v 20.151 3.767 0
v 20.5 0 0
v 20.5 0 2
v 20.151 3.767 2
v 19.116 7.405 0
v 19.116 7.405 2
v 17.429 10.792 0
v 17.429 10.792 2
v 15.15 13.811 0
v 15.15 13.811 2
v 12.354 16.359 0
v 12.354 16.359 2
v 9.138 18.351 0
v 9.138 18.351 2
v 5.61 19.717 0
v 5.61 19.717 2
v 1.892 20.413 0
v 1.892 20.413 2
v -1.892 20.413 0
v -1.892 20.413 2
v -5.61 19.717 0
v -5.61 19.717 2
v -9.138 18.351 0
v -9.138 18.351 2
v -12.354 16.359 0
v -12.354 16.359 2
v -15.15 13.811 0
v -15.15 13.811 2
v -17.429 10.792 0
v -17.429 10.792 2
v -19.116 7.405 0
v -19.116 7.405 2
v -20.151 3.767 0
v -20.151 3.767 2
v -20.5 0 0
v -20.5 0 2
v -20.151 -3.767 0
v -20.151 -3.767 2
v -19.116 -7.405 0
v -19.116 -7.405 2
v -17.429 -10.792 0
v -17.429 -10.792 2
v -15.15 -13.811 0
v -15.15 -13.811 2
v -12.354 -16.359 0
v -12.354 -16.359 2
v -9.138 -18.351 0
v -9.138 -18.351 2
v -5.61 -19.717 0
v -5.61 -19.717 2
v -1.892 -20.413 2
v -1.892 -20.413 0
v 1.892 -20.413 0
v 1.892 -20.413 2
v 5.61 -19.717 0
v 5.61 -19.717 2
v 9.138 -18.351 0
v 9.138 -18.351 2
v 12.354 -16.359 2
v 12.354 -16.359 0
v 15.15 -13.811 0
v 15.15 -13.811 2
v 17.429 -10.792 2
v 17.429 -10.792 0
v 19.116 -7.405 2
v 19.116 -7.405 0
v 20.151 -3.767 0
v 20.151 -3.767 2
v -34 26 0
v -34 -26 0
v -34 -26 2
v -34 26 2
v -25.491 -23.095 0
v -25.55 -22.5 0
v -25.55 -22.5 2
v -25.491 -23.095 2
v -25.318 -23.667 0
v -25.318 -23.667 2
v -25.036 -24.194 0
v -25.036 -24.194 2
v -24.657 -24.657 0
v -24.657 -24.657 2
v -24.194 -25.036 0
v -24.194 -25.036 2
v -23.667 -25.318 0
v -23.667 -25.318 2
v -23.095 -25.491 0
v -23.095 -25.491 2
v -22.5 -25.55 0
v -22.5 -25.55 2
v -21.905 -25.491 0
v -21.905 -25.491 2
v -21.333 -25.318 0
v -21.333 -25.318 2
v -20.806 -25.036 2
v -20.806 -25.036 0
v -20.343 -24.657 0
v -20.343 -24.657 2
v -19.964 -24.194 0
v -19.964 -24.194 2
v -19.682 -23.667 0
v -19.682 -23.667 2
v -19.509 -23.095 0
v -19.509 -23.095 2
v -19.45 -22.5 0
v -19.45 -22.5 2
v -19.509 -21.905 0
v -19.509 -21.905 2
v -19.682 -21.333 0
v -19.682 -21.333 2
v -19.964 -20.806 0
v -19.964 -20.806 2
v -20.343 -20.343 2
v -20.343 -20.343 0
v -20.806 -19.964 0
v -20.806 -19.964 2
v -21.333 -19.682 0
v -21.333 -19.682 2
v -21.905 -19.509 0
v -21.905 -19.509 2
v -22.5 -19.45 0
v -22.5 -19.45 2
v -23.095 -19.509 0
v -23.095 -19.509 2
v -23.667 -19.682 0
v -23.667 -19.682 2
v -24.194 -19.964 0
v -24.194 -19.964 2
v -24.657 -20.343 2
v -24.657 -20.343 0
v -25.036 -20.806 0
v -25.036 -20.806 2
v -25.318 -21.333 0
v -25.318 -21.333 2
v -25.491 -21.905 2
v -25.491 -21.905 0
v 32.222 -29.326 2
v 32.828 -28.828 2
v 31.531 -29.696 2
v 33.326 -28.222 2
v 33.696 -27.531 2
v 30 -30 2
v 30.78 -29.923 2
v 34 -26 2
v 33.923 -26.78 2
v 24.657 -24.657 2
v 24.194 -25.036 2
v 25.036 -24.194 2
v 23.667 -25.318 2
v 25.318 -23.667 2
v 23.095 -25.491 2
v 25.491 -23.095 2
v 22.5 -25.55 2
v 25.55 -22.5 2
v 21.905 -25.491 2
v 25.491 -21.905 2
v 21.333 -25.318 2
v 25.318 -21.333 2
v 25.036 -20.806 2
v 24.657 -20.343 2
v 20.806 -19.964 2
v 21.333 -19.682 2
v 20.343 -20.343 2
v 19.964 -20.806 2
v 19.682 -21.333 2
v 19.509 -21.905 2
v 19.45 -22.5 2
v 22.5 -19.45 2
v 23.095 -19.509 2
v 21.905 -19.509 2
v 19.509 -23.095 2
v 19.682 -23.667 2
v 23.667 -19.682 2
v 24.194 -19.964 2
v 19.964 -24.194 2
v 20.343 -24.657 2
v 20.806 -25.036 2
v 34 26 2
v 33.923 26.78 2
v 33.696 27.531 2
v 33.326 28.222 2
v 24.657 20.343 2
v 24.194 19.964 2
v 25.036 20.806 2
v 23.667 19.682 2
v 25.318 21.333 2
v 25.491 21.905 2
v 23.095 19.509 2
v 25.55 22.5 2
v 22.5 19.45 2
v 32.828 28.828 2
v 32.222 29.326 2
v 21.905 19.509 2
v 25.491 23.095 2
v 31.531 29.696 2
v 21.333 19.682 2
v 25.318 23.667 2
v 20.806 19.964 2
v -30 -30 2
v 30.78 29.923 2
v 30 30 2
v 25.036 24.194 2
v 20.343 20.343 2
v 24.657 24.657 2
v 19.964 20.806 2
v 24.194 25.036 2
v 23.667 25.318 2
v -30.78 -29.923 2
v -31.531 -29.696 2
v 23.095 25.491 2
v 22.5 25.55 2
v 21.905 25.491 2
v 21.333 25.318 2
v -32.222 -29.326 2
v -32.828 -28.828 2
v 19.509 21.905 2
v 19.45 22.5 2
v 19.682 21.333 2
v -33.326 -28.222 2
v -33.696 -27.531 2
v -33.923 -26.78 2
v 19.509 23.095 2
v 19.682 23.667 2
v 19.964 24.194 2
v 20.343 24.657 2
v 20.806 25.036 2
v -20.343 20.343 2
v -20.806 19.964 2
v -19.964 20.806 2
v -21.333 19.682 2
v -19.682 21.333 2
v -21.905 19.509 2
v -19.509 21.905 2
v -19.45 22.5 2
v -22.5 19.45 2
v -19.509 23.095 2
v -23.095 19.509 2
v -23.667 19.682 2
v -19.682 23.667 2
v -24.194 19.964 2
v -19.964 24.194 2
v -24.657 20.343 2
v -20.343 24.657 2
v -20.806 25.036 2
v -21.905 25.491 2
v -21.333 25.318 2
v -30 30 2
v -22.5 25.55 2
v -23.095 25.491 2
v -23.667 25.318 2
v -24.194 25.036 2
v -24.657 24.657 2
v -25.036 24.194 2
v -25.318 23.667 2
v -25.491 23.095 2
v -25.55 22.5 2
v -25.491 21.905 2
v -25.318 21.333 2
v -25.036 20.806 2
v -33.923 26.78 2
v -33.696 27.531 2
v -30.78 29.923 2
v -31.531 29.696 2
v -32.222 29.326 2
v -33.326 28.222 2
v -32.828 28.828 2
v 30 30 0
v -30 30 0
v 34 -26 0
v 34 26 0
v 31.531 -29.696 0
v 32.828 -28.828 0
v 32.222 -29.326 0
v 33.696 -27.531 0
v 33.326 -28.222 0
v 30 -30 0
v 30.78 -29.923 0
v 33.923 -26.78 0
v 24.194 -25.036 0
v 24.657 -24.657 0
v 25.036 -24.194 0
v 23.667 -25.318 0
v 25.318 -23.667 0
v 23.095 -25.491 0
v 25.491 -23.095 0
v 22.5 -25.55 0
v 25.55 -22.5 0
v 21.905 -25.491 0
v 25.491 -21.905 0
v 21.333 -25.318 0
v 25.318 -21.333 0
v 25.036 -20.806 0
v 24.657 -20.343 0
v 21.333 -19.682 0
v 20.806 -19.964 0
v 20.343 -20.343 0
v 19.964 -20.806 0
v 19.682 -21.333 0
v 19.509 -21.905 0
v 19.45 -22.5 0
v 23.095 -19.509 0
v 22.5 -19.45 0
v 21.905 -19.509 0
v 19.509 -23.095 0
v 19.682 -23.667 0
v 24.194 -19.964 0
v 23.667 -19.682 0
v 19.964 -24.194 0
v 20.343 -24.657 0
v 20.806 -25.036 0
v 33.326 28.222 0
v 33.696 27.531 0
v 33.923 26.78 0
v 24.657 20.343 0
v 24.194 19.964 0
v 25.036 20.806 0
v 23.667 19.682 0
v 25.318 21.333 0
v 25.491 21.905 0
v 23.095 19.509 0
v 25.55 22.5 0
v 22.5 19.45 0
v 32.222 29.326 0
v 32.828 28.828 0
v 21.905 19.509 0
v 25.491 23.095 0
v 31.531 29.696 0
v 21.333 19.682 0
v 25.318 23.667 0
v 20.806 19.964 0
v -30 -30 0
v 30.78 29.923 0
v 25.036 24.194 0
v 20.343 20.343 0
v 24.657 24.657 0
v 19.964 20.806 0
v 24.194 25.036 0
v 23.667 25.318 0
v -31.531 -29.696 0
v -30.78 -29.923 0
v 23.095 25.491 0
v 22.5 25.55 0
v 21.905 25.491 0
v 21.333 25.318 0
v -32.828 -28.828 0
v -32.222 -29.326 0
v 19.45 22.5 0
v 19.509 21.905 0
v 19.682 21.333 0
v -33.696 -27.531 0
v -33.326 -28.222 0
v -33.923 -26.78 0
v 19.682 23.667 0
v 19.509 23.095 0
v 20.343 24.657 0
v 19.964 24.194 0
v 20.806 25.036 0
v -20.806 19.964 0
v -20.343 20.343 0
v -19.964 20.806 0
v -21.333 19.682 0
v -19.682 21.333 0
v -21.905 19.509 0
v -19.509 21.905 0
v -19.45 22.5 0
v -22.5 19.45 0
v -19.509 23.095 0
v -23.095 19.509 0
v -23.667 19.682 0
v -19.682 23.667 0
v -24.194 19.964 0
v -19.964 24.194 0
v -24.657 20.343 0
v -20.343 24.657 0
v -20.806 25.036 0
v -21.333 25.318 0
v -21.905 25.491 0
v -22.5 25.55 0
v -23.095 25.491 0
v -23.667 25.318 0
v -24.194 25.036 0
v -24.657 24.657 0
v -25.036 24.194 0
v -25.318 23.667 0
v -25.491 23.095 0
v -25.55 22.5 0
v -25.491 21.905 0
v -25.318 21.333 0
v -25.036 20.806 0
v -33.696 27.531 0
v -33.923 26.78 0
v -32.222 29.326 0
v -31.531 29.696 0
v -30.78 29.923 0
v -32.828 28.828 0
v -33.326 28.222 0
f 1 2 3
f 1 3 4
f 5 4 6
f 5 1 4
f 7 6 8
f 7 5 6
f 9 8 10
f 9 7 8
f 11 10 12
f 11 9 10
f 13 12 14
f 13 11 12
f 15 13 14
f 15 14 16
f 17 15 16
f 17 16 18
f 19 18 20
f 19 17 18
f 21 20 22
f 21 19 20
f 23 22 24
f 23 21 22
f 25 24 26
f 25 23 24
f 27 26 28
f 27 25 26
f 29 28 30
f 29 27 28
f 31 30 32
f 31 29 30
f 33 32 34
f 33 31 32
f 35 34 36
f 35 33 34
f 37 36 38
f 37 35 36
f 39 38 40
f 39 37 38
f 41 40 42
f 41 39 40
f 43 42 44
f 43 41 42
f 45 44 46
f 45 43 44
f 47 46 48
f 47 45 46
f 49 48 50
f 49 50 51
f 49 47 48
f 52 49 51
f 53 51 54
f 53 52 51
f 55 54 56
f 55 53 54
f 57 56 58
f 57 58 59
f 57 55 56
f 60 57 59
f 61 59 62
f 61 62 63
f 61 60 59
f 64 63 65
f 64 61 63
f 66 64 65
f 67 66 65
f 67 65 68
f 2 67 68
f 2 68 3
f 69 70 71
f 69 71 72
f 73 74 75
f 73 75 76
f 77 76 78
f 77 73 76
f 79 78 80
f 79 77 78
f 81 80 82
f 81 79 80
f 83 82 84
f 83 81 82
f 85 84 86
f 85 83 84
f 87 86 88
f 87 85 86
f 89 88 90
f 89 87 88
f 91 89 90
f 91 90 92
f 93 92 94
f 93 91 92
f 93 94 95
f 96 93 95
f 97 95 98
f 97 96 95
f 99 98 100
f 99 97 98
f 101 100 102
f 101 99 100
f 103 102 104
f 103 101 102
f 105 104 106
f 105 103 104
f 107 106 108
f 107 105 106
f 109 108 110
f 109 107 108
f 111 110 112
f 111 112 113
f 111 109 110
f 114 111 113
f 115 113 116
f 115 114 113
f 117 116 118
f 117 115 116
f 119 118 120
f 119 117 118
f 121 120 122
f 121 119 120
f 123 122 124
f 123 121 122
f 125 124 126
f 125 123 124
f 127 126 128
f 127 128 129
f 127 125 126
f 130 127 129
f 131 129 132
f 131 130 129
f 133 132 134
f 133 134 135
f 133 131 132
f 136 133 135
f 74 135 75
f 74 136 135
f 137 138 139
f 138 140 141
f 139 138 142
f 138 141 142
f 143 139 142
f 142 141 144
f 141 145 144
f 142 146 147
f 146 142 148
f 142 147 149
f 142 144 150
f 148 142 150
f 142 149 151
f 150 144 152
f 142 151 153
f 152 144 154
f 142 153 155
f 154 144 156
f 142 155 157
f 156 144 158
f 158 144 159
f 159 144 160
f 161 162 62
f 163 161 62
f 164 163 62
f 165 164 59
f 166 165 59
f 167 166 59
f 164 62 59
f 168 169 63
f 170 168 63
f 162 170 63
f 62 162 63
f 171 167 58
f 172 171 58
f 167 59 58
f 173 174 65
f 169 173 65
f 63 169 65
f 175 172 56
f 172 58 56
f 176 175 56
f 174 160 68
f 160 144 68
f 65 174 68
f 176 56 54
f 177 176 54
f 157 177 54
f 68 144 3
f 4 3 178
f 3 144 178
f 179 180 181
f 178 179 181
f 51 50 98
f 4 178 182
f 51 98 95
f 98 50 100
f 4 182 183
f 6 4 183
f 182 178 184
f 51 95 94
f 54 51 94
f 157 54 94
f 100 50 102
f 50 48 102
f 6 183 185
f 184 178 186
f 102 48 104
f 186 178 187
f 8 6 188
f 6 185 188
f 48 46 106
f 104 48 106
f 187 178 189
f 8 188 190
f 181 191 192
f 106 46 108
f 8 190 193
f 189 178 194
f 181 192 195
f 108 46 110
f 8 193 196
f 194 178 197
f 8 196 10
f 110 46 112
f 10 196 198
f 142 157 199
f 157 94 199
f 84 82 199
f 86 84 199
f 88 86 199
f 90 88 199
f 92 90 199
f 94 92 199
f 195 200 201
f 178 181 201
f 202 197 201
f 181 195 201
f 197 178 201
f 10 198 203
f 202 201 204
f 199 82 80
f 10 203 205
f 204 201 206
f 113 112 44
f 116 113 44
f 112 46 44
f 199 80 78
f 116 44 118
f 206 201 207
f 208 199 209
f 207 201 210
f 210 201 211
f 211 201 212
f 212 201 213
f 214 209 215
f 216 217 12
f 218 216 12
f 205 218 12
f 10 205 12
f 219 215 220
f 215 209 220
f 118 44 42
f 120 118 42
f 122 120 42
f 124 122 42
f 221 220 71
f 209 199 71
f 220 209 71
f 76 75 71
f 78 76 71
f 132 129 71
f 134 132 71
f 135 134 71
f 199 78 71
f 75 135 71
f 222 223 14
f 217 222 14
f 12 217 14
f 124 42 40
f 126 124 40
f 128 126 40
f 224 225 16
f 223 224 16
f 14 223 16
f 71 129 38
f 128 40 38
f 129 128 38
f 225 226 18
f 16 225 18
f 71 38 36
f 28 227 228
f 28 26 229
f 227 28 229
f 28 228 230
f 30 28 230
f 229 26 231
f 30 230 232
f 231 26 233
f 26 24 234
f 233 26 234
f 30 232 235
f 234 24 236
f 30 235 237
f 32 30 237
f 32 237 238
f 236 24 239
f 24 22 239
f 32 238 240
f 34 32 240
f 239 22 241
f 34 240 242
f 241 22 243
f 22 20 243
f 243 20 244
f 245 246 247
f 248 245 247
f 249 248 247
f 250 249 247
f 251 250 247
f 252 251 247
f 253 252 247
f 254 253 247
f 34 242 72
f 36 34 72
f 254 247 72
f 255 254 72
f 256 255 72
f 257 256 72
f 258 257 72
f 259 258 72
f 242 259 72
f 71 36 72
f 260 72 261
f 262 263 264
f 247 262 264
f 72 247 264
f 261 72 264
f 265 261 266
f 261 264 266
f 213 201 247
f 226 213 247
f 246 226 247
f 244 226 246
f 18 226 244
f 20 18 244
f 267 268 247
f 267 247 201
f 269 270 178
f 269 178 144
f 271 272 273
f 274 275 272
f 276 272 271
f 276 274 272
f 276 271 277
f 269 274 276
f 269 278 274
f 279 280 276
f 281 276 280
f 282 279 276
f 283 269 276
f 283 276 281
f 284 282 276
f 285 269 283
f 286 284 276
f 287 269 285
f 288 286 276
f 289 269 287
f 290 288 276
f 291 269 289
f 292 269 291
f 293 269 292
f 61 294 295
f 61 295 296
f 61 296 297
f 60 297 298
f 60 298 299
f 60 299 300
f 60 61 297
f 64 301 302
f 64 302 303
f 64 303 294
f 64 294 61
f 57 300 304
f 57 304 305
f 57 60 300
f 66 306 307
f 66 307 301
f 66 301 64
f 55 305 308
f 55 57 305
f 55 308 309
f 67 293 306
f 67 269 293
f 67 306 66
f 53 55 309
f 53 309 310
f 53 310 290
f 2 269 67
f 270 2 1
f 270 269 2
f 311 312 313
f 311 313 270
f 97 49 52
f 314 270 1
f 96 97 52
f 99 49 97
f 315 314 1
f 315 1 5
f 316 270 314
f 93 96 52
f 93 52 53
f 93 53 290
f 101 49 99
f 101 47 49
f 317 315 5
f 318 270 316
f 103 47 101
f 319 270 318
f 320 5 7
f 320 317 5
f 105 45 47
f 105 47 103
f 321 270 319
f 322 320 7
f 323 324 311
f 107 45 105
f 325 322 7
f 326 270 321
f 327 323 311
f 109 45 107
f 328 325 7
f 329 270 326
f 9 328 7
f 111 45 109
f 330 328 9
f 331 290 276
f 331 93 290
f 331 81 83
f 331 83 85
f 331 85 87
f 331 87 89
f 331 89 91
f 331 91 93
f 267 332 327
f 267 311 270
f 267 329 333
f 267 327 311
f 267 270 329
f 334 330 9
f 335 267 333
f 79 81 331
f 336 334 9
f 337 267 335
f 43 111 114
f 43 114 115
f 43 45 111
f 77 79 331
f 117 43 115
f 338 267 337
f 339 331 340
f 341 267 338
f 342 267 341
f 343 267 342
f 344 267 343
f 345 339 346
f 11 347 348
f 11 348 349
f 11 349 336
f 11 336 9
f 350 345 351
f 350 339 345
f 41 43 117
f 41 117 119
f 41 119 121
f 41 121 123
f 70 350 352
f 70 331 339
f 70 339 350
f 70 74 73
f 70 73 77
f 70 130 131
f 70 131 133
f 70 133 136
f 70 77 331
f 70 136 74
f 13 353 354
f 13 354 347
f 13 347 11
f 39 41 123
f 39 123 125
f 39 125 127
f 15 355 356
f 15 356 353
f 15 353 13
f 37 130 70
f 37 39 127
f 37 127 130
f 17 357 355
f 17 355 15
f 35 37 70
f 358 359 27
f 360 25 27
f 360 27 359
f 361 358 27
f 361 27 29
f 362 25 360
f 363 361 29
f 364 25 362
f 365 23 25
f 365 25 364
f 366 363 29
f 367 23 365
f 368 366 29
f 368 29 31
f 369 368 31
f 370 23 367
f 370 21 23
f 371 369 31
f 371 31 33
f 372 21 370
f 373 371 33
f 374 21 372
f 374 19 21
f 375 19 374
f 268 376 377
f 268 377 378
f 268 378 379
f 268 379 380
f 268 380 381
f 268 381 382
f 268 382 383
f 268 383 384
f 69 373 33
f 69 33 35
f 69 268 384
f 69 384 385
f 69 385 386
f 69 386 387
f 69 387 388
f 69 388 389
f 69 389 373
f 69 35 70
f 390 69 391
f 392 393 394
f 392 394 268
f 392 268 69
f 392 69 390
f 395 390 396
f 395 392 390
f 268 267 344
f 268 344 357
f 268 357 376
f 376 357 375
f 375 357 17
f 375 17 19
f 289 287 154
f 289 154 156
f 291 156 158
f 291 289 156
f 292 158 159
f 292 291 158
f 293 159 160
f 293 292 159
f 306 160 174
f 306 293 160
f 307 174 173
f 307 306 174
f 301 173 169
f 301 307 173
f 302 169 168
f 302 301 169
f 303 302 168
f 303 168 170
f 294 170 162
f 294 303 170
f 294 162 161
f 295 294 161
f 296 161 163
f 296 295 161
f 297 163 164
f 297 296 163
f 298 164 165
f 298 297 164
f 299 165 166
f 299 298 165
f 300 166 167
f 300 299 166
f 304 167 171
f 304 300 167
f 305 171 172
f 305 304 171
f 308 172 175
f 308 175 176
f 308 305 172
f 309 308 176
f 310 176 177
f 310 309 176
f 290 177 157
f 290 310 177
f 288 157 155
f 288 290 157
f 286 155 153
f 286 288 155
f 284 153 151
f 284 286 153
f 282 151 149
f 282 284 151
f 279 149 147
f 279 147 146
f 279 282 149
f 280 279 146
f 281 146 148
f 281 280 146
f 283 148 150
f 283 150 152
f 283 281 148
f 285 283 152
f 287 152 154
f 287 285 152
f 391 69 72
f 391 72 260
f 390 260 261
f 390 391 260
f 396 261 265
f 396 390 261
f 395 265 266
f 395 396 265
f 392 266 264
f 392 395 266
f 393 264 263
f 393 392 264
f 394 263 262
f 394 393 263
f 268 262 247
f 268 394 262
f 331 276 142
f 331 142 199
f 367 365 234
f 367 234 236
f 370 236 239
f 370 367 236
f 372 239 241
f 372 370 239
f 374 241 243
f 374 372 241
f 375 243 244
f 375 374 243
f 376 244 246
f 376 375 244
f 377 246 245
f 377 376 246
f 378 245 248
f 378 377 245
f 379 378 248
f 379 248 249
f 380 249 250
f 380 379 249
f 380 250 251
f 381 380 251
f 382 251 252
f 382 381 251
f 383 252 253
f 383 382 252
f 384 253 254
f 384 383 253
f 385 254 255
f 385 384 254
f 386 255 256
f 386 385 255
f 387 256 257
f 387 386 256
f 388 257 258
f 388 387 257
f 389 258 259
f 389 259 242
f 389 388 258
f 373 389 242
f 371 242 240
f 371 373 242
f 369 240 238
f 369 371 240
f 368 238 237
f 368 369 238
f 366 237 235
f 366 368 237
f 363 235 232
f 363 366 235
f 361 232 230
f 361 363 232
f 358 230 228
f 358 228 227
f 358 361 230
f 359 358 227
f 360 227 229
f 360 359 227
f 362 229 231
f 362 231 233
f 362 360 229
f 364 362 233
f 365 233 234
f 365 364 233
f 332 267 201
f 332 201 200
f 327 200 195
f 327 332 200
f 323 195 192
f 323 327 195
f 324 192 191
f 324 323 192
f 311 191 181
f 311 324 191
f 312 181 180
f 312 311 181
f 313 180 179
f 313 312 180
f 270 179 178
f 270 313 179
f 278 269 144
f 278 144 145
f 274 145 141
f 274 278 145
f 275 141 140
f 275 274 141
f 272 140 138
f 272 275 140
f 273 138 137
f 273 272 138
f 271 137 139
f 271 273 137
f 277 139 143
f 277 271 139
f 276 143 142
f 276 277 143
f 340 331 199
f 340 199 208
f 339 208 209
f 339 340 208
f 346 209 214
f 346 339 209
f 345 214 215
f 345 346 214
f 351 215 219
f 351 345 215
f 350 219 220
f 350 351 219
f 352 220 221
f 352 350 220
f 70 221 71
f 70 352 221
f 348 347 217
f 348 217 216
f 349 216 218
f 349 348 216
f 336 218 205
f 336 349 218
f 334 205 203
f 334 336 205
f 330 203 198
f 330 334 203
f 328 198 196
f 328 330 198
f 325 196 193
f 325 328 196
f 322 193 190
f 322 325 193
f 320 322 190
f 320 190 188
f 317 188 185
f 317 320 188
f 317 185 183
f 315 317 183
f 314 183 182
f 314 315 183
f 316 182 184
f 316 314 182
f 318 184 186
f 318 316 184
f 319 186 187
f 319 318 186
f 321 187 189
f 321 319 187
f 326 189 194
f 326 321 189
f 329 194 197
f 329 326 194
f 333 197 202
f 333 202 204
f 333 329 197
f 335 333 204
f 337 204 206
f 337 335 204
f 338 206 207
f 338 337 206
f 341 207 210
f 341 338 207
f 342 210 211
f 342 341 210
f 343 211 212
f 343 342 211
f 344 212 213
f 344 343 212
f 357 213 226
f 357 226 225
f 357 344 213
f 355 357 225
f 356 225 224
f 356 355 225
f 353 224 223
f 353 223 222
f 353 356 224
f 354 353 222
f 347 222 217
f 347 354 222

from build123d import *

# Parameters (mm, degrees)
SKETCH1_R           = 3.05
SKETCH1_R_2         = 20.5
BOSS_EXTRUDE1_DEPTH = 2


with BuildPart() as part:
    # Sketch1 → Boss-Extrude1 (new body)
    with BuildSketch(Plane.XY):
        with BuildLine():
            Line((-30, 30), (30, 30))
            ThreePointArc((30, 30), (32.828427125, 28.828427125), (34, 26))
            Line((34, 26), (34, -26))
            ThreePointArc((34, -26), (32.828427125, -28.828427125), (30, -30))
            Line((30, -30), (-30, -30))
            ThreePointArc((-30, -30), (-32.828427125, -28.828427125), (-34, -26))
            Line((-34, -26), (-34, 26))
            ThreePointArc((-34, 26), (-32.828427125, 28.828427125), (-30, 30))
        make_face()
        with Locations((22.5, -22.5)):
            Circle(SKETCH1_R, mode=Mode.SUBTRACT)
        with Locations(Location((-22.5, -22.5, 0), (0, 0, 180))):
            Circle(SKETCH1_R, mode=Mode.SUBTRACT)
        with Locations((-22.5, 22.5)):
            Circle(SKETCH1_R, mode=Mode.SUBTRACT)
        with Locations(Location((22.5, 22.5, 0), (0, 0, 180))):
            Circle(SKETCH1_R, mode=Mode.SUBTRACT)
        Circle(SKETCH1_R_2, mode=Mode.SUBTRACT)
    extrude(amount=BOSS_EXTRUDE1_DEPTH)


solid = part.part
